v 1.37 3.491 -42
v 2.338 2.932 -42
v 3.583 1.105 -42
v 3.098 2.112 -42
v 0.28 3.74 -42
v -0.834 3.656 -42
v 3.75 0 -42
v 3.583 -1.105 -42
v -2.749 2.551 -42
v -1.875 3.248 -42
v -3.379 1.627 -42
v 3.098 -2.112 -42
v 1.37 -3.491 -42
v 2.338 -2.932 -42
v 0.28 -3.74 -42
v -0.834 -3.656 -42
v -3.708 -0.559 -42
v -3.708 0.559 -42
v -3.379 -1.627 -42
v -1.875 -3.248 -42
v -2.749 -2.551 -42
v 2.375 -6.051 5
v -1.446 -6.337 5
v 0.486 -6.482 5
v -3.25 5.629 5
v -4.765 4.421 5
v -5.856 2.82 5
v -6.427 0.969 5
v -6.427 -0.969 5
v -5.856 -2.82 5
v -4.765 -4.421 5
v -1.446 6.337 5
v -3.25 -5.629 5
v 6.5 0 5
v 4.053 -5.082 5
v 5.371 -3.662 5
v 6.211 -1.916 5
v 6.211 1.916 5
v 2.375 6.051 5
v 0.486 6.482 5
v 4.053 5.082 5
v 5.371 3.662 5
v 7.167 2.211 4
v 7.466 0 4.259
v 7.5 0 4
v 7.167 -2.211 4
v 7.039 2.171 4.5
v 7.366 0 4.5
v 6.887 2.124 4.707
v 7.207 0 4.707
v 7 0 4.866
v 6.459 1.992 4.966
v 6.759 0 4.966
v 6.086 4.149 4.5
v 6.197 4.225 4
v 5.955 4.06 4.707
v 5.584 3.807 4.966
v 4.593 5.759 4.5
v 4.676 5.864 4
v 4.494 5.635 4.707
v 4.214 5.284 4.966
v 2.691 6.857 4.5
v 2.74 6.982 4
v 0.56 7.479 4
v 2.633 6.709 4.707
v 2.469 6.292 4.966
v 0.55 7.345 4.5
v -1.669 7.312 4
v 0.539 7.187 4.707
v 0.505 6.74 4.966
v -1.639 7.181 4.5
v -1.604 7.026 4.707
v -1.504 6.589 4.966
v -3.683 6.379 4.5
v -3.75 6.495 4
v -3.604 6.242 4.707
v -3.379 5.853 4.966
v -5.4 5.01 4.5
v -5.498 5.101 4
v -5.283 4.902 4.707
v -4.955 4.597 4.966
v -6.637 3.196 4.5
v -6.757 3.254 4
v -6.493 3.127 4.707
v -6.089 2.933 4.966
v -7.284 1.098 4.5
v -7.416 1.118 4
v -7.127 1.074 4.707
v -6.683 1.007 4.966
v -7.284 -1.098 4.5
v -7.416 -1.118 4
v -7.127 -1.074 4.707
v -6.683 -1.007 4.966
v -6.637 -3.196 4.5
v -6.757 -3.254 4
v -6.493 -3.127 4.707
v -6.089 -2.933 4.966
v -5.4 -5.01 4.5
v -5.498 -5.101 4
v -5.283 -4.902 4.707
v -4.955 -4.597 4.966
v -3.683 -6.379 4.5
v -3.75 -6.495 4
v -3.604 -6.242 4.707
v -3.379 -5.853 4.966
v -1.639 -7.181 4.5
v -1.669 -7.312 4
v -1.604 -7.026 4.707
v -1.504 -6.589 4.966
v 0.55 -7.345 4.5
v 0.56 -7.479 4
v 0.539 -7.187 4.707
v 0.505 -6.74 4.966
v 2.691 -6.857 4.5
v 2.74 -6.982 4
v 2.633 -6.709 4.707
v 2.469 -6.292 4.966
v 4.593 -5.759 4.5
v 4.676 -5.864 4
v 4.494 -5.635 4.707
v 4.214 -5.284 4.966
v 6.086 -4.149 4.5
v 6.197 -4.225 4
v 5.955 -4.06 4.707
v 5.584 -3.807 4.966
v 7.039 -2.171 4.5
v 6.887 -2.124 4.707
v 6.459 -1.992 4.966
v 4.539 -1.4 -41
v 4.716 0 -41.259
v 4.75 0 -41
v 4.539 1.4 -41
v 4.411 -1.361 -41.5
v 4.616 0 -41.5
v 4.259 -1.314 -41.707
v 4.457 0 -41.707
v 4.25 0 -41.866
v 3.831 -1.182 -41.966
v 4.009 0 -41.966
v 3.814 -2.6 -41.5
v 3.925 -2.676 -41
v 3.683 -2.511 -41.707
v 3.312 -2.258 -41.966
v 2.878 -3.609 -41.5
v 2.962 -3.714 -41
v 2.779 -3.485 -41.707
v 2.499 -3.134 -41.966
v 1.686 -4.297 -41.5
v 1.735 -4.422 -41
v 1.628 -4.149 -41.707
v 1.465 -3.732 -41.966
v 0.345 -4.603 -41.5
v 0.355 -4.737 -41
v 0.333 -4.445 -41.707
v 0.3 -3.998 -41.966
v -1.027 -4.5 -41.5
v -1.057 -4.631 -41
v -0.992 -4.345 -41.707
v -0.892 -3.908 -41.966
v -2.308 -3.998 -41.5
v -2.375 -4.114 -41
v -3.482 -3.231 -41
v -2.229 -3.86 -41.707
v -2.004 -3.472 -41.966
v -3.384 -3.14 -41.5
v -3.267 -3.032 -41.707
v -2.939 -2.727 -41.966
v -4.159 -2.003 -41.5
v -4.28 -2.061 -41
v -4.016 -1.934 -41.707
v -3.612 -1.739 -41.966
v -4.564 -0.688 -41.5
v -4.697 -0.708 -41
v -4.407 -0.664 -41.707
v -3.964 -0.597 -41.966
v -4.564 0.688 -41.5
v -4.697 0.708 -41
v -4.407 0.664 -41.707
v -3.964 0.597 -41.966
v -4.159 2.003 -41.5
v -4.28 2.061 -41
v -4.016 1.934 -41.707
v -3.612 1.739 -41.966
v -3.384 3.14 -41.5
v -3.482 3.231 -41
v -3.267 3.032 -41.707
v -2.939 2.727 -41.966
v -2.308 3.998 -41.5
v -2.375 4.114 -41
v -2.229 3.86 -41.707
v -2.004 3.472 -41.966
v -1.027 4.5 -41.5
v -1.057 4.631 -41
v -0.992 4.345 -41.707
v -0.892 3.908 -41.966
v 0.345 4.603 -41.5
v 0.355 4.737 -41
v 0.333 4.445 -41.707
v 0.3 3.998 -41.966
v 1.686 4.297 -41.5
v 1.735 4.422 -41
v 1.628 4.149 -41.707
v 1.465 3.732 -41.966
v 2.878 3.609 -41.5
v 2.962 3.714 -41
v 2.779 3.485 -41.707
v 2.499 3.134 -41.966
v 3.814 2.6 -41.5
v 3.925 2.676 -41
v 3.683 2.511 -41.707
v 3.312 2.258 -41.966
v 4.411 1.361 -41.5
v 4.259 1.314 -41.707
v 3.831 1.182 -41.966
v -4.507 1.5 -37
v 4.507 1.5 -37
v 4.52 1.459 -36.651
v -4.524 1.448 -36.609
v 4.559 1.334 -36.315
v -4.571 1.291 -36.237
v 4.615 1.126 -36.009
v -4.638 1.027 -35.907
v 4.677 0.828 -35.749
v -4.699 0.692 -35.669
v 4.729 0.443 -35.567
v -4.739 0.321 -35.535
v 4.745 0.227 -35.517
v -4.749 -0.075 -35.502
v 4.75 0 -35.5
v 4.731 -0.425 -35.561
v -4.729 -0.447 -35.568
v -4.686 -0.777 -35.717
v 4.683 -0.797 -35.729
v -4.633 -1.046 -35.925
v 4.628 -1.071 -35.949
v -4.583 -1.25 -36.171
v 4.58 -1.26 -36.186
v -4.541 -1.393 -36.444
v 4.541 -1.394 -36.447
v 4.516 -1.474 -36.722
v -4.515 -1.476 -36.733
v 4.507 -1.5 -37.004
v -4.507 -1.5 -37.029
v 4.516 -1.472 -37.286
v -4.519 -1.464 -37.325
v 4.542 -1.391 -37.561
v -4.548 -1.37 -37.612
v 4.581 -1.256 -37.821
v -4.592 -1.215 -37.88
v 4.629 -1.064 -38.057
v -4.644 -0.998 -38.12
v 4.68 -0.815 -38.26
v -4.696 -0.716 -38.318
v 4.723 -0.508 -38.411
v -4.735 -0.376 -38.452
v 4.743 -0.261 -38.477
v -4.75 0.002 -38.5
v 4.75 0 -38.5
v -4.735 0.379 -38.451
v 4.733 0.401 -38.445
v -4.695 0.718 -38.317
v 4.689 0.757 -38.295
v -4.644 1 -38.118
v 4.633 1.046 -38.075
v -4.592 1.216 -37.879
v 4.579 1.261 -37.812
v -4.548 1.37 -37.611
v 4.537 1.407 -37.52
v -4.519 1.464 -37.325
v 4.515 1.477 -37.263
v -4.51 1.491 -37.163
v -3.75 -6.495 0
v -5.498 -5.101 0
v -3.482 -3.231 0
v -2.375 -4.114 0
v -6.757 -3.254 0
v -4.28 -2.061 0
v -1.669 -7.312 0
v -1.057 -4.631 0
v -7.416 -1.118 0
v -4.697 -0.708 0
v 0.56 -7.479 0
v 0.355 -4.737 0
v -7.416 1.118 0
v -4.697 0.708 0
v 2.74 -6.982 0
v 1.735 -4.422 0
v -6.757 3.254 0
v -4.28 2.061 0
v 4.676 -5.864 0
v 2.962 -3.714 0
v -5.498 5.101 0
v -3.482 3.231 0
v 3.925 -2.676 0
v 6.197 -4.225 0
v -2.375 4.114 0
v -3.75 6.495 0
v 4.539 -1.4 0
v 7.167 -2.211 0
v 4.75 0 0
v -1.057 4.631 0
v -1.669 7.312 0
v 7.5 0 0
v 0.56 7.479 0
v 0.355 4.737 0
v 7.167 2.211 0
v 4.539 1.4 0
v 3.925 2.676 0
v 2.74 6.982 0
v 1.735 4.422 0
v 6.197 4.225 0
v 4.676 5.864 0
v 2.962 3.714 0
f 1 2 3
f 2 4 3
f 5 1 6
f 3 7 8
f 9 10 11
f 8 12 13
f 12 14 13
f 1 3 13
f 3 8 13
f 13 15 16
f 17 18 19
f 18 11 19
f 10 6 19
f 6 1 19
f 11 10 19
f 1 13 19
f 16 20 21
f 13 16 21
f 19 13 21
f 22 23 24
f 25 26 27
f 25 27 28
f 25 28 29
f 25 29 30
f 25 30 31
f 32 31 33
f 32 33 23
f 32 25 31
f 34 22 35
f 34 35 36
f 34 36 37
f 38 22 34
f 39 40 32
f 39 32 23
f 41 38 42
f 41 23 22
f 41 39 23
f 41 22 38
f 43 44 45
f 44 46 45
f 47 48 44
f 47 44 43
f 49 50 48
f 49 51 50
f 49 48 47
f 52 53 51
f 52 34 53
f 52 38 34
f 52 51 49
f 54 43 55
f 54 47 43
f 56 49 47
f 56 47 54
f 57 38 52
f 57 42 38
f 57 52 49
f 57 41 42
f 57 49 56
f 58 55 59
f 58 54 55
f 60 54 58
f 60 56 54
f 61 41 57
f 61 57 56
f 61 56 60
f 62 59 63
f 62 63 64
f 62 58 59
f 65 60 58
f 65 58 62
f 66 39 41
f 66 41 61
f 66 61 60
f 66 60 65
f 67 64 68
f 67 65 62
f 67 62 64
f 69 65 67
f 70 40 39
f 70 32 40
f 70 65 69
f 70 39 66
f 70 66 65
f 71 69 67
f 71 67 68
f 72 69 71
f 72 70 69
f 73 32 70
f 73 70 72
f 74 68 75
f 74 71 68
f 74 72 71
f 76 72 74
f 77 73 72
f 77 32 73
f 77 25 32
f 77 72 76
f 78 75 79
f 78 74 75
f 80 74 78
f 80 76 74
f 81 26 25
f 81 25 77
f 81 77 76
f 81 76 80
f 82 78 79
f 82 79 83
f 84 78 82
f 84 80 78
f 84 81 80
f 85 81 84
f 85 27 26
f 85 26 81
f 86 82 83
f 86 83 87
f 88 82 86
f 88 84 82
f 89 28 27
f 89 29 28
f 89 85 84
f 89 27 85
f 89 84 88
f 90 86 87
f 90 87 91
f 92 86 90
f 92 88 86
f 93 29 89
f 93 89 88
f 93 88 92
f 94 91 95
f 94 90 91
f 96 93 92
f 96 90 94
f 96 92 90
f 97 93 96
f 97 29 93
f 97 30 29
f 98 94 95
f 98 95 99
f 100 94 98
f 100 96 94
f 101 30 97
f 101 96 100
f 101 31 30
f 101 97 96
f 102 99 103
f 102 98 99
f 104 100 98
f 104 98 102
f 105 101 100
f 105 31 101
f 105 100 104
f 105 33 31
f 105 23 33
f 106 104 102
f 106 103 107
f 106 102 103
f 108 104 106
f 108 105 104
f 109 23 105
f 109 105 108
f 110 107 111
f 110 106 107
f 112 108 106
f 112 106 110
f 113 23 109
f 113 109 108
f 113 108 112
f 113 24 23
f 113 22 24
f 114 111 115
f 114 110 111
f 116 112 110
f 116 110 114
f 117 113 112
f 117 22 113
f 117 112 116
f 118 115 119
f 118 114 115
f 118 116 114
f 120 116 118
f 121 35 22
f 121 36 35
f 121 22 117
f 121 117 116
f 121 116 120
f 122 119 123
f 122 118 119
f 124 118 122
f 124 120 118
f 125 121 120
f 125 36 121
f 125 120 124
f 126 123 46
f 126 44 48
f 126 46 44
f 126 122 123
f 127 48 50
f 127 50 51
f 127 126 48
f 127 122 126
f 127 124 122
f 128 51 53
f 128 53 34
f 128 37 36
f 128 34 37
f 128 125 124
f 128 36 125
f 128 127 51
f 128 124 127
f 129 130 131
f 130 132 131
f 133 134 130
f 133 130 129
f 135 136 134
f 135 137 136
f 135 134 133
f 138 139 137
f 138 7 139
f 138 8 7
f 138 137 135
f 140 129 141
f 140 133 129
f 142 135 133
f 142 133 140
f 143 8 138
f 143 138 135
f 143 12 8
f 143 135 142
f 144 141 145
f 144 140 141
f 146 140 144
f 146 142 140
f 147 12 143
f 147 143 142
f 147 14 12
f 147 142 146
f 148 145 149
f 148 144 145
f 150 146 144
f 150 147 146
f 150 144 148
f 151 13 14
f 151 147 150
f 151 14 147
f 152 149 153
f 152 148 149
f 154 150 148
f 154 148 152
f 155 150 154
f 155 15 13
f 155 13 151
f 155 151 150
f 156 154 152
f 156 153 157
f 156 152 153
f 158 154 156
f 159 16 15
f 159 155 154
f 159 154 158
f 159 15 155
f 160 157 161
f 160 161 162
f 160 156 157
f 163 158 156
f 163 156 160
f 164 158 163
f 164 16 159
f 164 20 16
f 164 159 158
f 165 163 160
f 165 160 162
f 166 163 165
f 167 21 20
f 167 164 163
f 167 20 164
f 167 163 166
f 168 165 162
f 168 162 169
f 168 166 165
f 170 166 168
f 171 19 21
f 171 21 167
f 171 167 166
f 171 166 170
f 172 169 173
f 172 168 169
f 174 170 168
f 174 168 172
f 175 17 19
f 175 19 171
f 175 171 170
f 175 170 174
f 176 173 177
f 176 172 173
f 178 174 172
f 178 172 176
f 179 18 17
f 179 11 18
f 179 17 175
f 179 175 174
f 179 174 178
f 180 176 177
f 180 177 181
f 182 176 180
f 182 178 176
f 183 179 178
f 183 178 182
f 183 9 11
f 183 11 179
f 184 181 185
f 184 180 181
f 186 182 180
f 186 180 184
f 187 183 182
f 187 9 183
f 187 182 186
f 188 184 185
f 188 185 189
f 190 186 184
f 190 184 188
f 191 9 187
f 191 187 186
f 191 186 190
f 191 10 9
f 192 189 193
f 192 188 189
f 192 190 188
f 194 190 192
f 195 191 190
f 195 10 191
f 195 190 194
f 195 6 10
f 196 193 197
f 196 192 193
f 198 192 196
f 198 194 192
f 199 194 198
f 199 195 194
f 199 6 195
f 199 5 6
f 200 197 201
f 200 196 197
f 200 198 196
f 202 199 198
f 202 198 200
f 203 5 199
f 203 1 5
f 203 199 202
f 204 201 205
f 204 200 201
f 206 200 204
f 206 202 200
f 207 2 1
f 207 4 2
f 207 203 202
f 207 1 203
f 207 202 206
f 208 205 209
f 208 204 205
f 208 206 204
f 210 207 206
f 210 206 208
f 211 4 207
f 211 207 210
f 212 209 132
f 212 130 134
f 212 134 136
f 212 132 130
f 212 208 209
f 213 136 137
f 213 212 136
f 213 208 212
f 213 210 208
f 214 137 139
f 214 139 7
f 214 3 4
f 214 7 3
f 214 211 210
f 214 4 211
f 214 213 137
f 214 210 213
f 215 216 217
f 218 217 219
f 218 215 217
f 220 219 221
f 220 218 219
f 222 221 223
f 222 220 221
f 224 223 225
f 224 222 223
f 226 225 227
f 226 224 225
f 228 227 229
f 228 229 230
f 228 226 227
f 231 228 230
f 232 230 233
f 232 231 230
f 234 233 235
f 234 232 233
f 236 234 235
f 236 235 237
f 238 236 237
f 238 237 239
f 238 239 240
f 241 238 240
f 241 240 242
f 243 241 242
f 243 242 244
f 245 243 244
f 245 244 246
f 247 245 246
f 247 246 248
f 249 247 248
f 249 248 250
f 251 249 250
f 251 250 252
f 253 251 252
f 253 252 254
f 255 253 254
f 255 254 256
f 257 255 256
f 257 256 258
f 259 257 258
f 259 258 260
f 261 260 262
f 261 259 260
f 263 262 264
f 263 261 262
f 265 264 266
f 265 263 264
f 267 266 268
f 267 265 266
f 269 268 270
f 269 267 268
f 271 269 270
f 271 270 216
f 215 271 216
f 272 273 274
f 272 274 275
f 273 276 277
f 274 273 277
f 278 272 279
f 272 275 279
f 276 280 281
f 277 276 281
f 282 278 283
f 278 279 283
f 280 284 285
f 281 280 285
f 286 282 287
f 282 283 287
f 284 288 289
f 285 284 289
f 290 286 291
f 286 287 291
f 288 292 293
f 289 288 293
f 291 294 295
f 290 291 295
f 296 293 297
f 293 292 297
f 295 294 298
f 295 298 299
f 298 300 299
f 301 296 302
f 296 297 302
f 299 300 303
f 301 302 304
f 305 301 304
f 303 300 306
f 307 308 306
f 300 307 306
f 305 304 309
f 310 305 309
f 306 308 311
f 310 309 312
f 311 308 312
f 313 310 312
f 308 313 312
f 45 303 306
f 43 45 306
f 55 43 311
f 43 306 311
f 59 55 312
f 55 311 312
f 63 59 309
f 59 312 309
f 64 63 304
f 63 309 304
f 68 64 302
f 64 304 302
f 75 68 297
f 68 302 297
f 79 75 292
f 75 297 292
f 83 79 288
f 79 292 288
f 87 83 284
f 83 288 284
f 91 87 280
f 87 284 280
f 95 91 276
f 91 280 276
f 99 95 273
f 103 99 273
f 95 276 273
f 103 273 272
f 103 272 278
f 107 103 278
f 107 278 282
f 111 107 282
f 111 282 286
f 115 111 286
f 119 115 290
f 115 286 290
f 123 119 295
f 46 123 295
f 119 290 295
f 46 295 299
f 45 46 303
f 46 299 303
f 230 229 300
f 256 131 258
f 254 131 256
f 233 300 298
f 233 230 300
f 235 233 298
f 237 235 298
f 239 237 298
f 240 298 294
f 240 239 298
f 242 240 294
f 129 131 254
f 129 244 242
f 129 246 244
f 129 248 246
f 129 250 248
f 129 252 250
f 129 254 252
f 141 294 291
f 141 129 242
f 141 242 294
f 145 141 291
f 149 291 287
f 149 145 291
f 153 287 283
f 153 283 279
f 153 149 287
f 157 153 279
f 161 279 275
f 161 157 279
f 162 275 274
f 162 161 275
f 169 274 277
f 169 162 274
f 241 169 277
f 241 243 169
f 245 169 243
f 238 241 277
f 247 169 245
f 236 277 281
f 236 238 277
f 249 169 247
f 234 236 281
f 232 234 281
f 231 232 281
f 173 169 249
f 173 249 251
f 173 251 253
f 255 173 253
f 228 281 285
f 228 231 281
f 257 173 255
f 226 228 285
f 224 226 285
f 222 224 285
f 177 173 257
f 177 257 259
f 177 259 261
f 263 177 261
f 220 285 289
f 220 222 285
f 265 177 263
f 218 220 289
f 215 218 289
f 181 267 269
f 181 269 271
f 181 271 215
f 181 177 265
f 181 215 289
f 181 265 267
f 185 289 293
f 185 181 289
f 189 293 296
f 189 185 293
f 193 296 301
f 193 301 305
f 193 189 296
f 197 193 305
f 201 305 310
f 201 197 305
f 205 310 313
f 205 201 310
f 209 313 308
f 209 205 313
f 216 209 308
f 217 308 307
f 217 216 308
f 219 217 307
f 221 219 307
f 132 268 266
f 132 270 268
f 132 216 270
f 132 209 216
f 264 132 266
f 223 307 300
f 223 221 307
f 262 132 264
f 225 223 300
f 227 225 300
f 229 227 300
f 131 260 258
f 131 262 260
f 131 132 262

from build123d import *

# Parameters (mm, degrees)
ESQUISSE1_R                         = 7.5
BOSS_EXTRU_1_DEPTH                  = 5
CONG_1_R                            = 1
ESQUISSE12_W                        = 4.75
ESQUISSE12_H                        = 42
CONG_2_R                            = 1
ENL_V_START                         = -4.7500001
ENL_V_DE_MAT_R_VOL_MINCE2_OUTLINE_R = 1.5
ENL_V_DE_MAT_R_VOL_MINCE2_DEPTH     = 9.5000002


# Read off the part's stored shape, not the designer's step: Enlèv. de mat.-Révol.-Mince2
with BuildPart() as part:
    # Esquisse1 → Boss.-Extru.1 (new body)
    with BuildSketch(Plane.XY):
        Circle(ESQUISSE1_R)
    extrude(amount=BOSS_EXTRU_1_DEPTH)

    # Congé1
    cong_1_edges = [part.edges().sort_by_distance(p)[0] for p in [
        (-7.5, 0, 5),
    ]]
    fillet(cong_1_edges, radius=CONG_1_R)

    # Esquisse12 → Révolution1 (revolve)
    with BuildSketch(Plane(origin=(0, 0, 0), x_dir=(1, 0, 0), z_dir=(0, 1, 0))):
        with Locations((2.375, 21)):
            Rectangle(ESQUISSE12_W, ESQUISSE12_H)
    revolve(axis=Axis((0, 0, 0), (0, 0, -1)))

    # Congé2
    cong_2_edges = [part.edges().sort_by_distance(p)[0] for p in [
        (-4.75, 0, -42),
    ]]
    fillet(cong_2_edges, radius=CONG_2_R)

    # Enlèv. de mat.-Révol.-Mince2 outline → Enlèv. de mat.-Révol.-Mince2 (cut)
    with BuildSketch(Plane.YZ.offset(ENL_V_START)):
        with Locations((0, -37)):
            Circle(ENL_V_DE_MAT_R_VOL_MINCE2_OUTLINE_R)
    extrude(amount=ENL_V_DE_MAT_R_VOL_MINCE2_DEPTH, mode=Mode.SUBTRACT)


solid = part.part
